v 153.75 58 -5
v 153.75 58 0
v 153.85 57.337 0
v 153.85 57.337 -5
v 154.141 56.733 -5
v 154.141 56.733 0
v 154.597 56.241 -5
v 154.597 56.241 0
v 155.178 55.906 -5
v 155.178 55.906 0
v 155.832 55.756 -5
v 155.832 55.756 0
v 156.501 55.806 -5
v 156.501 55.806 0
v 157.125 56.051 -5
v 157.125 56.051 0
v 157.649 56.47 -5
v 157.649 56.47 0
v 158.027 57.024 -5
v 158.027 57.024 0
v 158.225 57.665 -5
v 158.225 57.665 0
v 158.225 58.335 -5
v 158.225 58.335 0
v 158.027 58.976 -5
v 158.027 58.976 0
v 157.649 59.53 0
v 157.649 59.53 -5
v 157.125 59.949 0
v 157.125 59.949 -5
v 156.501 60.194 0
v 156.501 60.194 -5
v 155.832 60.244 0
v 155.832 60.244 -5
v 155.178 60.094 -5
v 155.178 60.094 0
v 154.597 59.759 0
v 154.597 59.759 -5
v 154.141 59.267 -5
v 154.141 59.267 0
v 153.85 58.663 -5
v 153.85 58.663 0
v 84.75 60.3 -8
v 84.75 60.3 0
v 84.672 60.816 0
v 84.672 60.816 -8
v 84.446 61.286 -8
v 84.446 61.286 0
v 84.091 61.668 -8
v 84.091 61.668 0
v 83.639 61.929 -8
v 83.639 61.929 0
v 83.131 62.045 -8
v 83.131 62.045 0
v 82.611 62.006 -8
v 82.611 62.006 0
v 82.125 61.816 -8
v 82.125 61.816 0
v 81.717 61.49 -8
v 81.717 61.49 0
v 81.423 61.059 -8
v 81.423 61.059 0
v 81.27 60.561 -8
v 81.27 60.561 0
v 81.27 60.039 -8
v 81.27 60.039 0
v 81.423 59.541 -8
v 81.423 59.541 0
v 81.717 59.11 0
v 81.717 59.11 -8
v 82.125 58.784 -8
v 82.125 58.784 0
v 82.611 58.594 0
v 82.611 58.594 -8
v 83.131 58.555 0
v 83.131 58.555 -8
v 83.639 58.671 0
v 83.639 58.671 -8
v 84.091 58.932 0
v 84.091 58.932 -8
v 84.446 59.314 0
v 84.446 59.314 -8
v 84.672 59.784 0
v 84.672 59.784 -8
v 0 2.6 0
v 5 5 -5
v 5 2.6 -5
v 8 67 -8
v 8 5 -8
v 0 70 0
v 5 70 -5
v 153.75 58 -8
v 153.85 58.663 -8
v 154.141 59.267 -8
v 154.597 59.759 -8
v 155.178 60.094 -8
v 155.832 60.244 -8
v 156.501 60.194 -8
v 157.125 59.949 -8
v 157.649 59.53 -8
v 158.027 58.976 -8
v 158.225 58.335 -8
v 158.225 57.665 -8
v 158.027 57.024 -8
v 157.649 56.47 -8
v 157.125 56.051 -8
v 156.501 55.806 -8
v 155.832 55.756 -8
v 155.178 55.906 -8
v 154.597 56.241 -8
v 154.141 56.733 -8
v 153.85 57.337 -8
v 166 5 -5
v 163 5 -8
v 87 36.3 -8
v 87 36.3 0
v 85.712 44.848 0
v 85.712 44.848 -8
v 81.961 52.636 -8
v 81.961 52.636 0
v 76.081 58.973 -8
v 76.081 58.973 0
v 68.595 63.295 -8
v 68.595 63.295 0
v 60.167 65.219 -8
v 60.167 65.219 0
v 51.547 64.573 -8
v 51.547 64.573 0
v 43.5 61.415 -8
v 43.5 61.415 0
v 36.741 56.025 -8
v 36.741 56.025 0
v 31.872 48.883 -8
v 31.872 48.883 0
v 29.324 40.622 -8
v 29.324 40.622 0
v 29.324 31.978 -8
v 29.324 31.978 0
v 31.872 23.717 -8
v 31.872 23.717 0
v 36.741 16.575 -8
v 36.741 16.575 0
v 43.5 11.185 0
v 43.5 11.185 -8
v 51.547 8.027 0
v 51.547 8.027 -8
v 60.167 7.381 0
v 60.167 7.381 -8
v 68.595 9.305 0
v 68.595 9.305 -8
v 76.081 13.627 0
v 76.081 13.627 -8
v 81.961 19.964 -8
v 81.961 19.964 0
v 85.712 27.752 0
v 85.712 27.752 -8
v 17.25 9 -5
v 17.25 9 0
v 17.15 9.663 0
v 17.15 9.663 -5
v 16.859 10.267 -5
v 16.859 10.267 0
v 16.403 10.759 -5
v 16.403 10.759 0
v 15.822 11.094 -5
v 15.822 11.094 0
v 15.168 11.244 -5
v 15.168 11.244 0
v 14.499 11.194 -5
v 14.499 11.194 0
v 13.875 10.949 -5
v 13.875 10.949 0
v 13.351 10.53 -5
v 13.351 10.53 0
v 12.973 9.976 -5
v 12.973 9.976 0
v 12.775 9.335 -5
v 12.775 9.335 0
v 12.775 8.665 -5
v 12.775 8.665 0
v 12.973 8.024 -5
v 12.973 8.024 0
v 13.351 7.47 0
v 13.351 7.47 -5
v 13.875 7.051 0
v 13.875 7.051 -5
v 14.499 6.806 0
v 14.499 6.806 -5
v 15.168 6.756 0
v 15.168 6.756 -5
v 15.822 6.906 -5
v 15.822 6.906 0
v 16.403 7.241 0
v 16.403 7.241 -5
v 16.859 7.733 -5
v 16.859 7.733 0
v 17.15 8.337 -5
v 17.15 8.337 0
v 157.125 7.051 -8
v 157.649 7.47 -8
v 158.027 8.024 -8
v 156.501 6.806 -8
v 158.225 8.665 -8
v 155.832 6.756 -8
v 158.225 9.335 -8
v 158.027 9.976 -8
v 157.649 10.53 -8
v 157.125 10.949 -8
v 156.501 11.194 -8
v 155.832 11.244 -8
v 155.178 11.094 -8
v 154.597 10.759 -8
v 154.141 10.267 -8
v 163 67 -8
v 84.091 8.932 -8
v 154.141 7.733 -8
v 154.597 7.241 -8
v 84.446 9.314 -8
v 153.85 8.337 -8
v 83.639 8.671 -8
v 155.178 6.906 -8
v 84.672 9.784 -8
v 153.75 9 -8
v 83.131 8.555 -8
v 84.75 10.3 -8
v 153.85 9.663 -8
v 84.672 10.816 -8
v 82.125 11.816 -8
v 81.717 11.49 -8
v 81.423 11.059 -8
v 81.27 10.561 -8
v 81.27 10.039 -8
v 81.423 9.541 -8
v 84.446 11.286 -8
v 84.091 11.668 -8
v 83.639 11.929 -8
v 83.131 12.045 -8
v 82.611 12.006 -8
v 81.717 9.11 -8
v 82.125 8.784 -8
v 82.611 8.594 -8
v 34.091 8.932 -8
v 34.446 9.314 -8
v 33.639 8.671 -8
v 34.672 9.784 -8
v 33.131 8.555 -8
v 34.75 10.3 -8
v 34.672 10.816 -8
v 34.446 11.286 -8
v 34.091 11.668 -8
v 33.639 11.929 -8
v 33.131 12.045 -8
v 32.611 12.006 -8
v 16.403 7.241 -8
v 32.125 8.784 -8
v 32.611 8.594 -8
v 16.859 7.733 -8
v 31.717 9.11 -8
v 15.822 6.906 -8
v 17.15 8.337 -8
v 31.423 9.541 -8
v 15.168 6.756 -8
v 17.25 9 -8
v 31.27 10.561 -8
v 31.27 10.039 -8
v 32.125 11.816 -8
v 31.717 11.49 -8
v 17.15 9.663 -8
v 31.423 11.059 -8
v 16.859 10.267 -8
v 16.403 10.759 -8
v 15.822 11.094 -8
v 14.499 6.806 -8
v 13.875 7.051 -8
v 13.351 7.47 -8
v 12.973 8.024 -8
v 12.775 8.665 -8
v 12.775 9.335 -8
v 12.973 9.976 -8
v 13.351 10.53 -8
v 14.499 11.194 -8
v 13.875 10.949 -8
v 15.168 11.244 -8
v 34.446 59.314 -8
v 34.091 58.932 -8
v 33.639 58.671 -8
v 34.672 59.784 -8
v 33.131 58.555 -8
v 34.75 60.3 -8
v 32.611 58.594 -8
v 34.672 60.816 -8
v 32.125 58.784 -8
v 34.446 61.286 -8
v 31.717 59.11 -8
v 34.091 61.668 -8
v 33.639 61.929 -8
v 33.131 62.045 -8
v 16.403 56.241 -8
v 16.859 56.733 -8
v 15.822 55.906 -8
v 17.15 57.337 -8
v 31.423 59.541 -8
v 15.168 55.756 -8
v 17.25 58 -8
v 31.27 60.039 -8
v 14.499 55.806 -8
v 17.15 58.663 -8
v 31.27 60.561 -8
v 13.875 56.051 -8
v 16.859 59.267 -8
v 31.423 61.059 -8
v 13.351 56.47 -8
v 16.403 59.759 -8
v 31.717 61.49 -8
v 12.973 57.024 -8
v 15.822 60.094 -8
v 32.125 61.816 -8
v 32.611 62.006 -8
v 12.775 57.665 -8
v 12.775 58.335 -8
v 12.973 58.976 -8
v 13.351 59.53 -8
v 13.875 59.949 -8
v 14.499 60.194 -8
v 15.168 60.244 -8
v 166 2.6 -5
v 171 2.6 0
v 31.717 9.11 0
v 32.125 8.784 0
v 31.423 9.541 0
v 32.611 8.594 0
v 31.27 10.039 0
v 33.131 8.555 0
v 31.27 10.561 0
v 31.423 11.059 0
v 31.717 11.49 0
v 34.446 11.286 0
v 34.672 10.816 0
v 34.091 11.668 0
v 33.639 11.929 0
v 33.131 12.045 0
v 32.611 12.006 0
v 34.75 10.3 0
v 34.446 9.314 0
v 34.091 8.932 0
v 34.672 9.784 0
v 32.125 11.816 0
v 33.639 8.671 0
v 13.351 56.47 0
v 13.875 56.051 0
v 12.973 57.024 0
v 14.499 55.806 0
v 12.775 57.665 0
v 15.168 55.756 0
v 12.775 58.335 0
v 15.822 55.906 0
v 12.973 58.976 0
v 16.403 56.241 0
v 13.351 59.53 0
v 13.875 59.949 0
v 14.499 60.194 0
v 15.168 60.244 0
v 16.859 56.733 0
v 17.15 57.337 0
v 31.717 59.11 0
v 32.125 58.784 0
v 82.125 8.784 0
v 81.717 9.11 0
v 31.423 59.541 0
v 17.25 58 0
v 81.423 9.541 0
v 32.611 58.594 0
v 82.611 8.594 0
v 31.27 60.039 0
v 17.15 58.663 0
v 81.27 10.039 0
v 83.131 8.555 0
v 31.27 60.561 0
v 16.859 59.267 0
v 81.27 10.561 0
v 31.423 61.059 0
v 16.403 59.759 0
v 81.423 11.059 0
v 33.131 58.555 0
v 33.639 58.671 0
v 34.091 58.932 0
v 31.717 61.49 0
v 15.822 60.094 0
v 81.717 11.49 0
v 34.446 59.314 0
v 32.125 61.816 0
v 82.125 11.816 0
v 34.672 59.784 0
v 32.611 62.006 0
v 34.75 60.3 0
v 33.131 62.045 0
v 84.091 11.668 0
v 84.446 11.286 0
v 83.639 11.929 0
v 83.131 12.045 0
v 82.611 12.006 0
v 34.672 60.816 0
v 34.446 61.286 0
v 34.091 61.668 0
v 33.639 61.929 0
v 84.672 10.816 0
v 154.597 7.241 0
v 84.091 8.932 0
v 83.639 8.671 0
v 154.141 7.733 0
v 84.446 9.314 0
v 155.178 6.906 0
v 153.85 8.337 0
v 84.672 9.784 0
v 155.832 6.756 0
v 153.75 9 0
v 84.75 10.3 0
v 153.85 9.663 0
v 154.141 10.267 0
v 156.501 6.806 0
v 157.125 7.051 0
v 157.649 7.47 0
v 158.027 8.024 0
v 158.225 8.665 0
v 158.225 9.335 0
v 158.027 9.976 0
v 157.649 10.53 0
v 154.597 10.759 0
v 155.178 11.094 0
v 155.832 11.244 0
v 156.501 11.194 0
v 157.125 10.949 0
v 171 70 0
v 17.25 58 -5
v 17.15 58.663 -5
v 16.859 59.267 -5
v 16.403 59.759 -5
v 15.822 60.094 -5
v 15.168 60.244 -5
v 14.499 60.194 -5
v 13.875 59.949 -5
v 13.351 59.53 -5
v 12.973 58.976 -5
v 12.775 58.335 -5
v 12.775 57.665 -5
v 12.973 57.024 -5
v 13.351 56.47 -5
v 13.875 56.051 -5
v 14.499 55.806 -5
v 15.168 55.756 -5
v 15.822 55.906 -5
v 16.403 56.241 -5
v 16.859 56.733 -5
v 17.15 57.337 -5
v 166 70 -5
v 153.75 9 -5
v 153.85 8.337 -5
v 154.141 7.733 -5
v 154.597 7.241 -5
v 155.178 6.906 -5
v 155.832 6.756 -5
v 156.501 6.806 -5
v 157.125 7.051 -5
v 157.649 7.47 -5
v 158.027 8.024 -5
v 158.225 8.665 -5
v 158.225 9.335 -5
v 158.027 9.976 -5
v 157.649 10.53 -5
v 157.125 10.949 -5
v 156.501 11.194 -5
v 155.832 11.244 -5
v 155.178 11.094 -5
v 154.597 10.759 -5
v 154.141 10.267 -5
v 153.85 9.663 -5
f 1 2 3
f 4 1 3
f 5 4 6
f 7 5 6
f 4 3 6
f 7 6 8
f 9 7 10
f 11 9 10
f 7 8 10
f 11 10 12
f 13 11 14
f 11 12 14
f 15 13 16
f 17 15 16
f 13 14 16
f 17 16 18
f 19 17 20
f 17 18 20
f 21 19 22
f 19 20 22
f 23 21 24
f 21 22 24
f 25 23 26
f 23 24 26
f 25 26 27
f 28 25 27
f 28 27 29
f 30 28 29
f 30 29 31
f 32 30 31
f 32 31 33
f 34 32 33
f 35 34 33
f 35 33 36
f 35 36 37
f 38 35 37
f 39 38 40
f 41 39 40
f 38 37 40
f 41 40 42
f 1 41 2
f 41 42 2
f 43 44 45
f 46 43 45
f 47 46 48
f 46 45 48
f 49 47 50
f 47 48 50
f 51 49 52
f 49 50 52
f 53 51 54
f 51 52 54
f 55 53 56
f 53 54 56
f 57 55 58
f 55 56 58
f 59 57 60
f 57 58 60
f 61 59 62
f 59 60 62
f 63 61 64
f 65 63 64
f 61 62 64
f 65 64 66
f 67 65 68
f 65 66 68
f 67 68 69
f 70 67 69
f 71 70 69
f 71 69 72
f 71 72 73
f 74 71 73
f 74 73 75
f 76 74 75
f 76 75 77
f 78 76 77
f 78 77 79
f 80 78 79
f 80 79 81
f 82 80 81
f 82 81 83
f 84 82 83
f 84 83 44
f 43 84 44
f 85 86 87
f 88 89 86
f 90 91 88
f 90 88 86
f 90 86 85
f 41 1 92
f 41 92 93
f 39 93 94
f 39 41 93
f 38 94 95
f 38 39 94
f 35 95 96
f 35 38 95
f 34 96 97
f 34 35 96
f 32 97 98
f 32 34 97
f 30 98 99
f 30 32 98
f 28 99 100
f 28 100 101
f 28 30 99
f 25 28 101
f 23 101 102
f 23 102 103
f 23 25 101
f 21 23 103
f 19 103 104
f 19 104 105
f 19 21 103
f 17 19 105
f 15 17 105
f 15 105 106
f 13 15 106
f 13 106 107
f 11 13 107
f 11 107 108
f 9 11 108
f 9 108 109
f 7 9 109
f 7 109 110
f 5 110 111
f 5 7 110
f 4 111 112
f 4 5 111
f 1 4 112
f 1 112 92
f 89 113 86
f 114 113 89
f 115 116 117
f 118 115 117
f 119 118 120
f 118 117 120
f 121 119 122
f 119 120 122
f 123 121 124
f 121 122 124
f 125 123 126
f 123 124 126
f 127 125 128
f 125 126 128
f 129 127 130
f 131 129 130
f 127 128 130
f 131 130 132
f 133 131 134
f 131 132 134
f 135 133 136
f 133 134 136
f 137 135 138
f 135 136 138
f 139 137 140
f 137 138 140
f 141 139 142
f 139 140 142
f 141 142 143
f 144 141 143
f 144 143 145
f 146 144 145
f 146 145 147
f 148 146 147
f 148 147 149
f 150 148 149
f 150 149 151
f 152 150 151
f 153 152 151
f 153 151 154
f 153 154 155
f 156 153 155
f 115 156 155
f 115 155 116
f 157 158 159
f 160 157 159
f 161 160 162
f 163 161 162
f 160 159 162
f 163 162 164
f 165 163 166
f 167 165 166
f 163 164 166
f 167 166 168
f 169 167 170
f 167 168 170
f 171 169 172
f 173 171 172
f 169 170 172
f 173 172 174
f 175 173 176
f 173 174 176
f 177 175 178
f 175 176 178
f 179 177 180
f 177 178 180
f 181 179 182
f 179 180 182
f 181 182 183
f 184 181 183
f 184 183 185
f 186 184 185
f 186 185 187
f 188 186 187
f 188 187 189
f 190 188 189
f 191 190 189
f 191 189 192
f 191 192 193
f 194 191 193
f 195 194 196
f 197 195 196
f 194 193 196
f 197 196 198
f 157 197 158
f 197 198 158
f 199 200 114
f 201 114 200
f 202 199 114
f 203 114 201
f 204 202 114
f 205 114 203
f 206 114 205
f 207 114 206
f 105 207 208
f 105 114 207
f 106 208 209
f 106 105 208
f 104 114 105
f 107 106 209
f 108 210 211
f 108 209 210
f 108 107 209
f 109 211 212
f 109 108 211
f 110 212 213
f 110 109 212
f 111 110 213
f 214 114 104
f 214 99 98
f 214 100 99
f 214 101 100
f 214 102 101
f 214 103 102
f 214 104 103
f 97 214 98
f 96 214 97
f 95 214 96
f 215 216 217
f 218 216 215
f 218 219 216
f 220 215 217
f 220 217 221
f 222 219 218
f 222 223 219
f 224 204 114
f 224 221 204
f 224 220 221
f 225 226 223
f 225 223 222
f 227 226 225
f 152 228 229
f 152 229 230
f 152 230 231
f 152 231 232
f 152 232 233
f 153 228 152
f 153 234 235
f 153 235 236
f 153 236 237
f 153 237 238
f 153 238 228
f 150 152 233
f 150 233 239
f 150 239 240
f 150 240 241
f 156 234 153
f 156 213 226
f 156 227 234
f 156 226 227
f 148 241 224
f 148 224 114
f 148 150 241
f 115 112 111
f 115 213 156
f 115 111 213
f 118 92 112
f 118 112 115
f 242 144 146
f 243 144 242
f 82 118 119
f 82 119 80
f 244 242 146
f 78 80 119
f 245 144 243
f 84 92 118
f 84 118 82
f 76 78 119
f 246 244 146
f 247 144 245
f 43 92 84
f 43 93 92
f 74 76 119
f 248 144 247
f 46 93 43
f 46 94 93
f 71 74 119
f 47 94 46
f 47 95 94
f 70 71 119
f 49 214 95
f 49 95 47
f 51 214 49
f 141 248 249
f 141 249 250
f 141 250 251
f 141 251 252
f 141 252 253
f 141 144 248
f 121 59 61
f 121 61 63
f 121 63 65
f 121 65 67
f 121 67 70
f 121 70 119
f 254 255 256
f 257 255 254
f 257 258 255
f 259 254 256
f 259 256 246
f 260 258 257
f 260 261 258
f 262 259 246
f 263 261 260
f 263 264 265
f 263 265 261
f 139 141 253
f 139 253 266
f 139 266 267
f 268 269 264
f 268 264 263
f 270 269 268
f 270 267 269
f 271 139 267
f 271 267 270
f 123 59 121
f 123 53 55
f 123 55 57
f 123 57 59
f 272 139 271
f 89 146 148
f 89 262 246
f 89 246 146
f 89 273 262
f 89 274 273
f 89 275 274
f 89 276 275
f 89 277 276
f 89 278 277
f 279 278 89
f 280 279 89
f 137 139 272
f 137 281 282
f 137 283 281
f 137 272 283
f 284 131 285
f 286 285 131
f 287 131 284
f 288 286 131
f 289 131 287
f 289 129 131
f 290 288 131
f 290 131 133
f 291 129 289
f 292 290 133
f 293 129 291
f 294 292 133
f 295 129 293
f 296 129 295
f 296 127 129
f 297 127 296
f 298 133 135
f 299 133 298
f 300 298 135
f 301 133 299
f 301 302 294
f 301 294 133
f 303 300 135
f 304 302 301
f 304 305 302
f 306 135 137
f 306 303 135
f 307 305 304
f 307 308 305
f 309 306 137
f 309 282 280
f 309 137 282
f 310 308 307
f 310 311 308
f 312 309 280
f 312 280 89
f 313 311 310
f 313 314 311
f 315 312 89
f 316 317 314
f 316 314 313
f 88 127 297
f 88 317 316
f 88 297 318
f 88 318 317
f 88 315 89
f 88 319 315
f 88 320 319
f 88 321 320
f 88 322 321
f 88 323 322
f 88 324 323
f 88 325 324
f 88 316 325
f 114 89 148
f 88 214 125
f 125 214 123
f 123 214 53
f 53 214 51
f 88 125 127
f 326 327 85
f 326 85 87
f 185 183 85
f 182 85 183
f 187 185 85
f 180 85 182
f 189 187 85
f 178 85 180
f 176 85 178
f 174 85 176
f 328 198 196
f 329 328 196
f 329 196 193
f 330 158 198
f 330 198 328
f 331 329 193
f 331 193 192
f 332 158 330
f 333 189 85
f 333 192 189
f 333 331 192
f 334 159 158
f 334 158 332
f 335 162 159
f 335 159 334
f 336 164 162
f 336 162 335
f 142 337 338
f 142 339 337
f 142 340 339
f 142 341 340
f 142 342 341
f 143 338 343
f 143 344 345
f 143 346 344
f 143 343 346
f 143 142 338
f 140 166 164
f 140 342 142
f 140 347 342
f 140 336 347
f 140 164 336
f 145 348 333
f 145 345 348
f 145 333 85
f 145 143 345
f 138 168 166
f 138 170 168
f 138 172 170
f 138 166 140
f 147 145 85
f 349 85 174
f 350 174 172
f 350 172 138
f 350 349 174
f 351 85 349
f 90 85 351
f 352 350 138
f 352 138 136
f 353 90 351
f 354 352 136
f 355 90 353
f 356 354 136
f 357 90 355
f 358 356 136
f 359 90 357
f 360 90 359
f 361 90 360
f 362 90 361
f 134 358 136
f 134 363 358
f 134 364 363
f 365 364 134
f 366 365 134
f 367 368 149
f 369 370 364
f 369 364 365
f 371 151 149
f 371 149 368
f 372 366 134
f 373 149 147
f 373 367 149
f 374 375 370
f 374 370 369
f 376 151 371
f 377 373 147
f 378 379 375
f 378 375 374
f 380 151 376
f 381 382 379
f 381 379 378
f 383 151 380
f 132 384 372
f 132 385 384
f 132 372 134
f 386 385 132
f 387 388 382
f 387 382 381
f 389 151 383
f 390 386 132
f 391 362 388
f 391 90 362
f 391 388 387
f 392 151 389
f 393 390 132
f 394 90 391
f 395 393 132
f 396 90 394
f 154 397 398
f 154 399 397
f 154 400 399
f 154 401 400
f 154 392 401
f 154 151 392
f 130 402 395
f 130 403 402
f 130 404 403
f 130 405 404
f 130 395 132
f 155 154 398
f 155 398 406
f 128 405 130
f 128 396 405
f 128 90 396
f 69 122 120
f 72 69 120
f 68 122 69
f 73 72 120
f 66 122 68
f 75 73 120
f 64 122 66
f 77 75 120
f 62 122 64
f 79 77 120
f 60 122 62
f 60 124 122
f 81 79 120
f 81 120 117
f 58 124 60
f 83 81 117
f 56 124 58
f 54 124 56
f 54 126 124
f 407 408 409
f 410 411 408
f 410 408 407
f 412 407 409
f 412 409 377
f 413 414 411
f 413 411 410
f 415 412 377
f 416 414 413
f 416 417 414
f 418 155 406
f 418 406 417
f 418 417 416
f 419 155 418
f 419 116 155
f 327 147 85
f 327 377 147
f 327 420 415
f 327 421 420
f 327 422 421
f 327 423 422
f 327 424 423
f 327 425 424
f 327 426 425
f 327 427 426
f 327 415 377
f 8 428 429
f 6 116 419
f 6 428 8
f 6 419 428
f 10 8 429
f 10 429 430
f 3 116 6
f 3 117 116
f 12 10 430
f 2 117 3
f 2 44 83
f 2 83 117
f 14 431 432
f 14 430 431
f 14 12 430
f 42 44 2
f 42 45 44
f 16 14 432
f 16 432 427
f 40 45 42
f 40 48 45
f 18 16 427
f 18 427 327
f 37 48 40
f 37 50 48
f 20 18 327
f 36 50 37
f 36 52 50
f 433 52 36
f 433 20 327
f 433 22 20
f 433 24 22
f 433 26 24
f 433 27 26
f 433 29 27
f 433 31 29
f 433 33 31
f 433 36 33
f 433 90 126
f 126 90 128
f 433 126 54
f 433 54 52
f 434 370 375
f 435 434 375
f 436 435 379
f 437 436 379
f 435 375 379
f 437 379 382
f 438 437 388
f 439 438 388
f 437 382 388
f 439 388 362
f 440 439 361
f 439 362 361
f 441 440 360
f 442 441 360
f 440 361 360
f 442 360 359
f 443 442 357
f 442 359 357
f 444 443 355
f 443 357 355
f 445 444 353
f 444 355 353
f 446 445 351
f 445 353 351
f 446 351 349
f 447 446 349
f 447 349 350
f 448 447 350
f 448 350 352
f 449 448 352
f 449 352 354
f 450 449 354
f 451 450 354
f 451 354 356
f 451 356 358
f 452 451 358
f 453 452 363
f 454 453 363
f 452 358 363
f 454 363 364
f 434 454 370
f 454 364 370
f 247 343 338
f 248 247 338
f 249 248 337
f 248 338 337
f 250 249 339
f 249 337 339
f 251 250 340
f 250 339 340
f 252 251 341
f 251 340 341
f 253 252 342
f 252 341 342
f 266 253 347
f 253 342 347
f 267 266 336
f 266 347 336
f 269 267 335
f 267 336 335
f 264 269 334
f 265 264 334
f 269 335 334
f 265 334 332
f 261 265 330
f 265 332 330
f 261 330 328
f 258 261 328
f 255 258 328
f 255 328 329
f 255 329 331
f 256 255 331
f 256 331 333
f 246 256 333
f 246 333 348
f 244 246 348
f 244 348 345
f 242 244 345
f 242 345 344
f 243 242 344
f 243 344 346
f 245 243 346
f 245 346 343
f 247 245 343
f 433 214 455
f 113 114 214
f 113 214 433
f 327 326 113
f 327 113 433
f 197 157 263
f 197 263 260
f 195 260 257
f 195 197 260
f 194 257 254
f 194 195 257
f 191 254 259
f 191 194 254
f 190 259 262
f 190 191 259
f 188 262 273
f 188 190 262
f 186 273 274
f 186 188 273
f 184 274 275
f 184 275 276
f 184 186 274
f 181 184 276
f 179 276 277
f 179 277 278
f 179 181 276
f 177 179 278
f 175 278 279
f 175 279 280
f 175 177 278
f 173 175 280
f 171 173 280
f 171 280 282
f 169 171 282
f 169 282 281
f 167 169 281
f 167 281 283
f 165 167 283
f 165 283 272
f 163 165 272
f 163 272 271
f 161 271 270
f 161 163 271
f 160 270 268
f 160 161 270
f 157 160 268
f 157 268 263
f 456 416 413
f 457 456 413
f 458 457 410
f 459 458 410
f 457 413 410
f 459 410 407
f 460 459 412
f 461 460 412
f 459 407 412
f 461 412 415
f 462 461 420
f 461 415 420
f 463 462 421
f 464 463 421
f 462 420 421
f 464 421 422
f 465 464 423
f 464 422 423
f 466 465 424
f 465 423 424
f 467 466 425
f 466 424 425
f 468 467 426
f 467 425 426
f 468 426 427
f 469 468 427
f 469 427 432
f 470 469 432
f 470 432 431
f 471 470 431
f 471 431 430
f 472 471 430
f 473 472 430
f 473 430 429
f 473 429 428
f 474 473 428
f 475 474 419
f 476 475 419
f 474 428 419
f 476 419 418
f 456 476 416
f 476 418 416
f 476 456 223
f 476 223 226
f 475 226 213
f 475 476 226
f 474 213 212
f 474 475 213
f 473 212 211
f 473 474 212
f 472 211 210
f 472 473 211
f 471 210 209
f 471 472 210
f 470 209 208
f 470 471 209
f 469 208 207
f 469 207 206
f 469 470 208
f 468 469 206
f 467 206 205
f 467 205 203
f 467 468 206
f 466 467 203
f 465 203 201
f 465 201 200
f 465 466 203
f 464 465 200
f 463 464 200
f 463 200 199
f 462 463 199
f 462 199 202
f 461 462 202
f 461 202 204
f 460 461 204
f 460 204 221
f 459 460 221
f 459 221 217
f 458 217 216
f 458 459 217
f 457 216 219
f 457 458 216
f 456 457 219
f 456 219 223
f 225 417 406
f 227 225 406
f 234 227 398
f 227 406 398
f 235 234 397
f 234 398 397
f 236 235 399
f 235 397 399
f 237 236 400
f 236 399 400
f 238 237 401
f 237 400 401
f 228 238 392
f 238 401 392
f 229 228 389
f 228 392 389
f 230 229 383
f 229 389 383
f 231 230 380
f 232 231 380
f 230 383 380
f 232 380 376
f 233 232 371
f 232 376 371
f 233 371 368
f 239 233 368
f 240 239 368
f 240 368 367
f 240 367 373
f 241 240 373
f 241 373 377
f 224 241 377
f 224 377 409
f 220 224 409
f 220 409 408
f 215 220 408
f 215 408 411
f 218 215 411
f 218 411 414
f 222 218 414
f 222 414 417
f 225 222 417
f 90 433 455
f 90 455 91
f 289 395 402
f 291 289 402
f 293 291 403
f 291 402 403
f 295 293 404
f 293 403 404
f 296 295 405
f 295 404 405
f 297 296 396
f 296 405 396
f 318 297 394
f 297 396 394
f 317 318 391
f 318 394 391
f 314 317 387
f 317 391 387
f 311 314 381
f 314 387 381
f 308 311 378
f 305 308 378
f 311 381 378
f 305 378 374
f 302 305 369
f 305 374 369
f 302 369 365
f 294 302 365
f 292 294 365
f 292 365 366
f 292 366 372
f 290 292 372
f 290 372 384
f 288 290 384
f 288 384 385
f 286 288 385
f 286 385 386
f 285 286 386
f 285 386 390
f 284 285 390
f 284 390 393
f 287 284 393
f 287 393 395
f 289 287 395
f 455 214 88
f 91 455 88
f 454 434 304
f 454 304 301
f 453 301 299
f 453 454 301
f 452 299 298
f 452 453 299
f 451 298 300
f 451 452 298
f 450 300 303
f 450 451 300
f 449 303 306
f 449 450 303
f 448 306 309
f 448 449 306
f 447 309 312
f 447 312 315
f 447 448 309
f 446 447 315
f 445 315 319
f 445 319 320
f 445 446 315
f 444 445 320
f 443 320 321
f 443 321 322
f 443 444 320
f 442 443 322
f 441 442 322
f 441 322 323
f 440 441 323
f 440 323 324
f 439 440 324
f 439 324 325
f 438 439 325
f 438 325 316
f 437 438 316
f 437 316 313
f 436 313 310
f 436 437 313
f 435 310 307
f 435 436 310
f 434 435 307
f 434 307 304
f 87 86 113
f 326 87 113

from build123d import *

# Parameters (mm, degrees)
SKETCH1_W           = 171
SKETCH1_H           = 70
SKETCH1_R           = 2.25
BOSS_EXTRUDE1_DEPTH = 5
SKETCH2_W           = 171
SKETCH2_H           = 65
SKETCH2_R           = 2.25
BOSS_EXTRUDE2_DEPTH = 3
CHAMFER1_SIZE       = 8
CHAMFER3_SIZE       = 3
SKETCH3_W           = 7.071067812
SKETCH3_H           = 2.6
CUT_EXTRUDE1_DEPTH  = 199.002168661
SKETCH4_R           = 29
SKETCH4_R_2         = 1.75
CUT_EXTRUDE2_DEPTH  = 185.945938047


with BuildPart() as part:
    # Sketch1 → Boss-Extrude1 (new body)
    with BuildSketch(Plane.XY):
        with Locations((85.5, 35)):
            Rectangle(SKETCH1_W, SKETCH1_H)
        with Locations((15, 9)):
            Circle(SKETCH1_R, mode=Mode.SUBTRACT)
        with Locations(Location((156, 9, 0), (0, 0, 180))):
            Circle(SKETCH1_R, mode=Mode.SUBTRACT)
        with Locations((15, 58)):
            Circle(SKETCH1_R, mode=Mode.SUBTRACT)
        with Locations(Location((156, 58, 0), (0, 0, 180))):
            Circle(SKETCH1_R, mode=Mode.SUBTRACT)
    extrude(amount=-BOSS_EXTRUDE1_DEPTH)

    # Sketch2 → Boss-Extrude2 (add)
    with BuildSketch(Plane(origin=(0, 0, -5), x_dir=(-1, 0, 0), z_dir=(0, 0, -1))):
        with Locations((-85.5, 37.5)):
            Rectangle(SKETCH2_W, SKETCH2_H)
        with Locations(Location((-15, 9, 0), (0, 0, 180))):
            Circle(SKETCH2_R, mode=Mode.SUBTRACT)
        with Locations((-156, 9)):
            Circle(SKETCH2_R, mode=Mode.SUBTRACT)
        with Locations(Location((-15, 58, 0), (0, 0, 180))):
            Circle(SKETCH2_R, mode=Mode.SUBTRACT)
        with Locations((-156, 58)):
            Circle(SKETCH2_R, mode=Mode.SUBTRACT)
    extrude(amount=BOSS_EXTRUDE2_DEPTH)

    # Chamfer1
    # the kernel refuses this chamfer: 8 mm, written as the material it takes off along each edge
    with BuildSketch(Plane(origin=(171, -15.573463904, -8), x_dir=(-0.9996219169112968, 0, -0.027495876610586296), z_dir=(0, 1, 0)), Plane(origin=(0, 90.573463904, -8), x_dir=(0.9996219169112968, 0, -0.027495876610586275), z_dir=(0, -1, 0))) as chamfer1_piece_1:
        Polygon((CHAMFER1_SIZE * 0.999621916911, CHAMFER1_SIZE * 0.0274958766106), (-CHAMFER1_SIZE * 0.0274958766106, CHAMFER1_SIZE * 0.999621916911), (0, 0), align=None)
    extrude(amount=106.146927807, mode=Mode.SUBTRACT)

    # Chamfer3
    chamfer3_edges = [part.edges().sort_by_distance(p)[0] for p in [
        (85.5, 70, -8),
    ]]
    chamfer(chamfer3_edges, length=CHAMFER3_SIZE)

    # Sketch3 → Cut-Extrude1 (cut, through all, along a direction that is not the sketch's normal)
    with BuildSketch(Plane(origin=(85.5, 0, -85.5), x_dir=(-0.7071067811865452, 0, -0.7071067811865498), z_dir=(0.7071067811865498, 0, -0.7071067811865452))):
        with Locations((-117.379725677, 1.3)):
            Rectangle(SKETCH3_W, SKETCH3_H)
    extrude(amount=-CUT_EXTRUDE1_DEPTH, dir=(1, 0, 0), mode=Mode.SUBTRACT)

    # Sketch4 → Cut-Extrude2 (cut, through all)
    with BuildSketch(Plane.XY):
        with Locations((58, 36.3)):
            Circle(SKETCH4_R)
        with Locations((33, 60.3)):
            Circle(SKETCH4_R_2)
        with Locations((83, 60.3)):
            Circle(SKETCH4_R_2)
        with Locations((83, 10.3)):
            Circle(SKETCH4_R_2)
        with Locations((33, 10.3)):
            Circle(SKETCH4_R_2)
    extrude(amount=-CUT_EXTRUDE2_DEPTH, mode=Mode.SUBTRACT)


solid = part.part
